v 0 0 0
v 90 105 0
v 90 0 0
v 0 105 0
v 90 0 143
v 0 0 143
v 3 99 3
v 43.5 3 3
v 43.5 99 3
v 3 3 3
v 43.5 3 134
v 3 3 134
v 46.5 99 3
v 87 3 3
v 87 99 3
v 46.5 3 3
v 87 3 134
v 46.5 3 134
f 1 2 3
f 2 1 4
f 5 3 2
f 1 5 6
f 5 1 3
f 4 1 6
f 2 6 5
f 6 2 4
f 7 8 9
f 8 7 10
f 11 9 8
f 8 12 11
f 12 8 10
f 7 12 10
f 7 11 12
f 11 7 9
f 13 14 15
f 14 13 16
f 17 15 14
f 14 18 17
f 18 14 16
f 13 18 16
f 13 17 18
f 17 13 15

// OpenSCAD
width = 90;
wedge_depth = 105;
base_depth = 370;
height = 143;

//base_thickness = 2;
base_thickness = 0;
wedge_thickness = 3;

module base(width, depth, thickness) {
	cube([width, depth, thickness]);
}

module wedge(width, depth, height) {
	polyhedron([
		// 0: back right
		[0, 0, 0],
		// 1: back left
		[width, 0, 0],
	
		// 2: front right
		[0, depth, 0],
		// 3: front left
		[width, depth, 0],

		// 4: top right
		[0, 0, height],
		// 5: top left
		[width, 0, height],
	], [
		[0, 1, 3, 2], // base
		[0, 4, 5, 1], // back
		[2, 3, 5, 4], // slope
		[1, 5, 3], // left side
		[0, 2, 4], // right side
	]);
}

module hollow_wedge(width, depth,
		height, thickness) {
	inner_width = width - 2 * thickness;
	inner_depth = depth - 3 * thickness;
	inner_height = height - 4 * thickness;

	difference() {
		wedge(width, depth, height);

		translate([thickness,
			thickness, thickness])
		wedge((inner_width - thickness) / 2,
			inner_depth,
			inner_height);

		translate([1.5 * thickness + inner_width / 2,
			thickness, thickness])
		wedge((inner_width - thickness) / 2,
			inner_depth,
			inner_height);
	}
}

if (base_thickness > 0) base(width, base_depth, base_thickness
);
hollow_wedge(width, wedge_depth, height, wedge_thickness);
